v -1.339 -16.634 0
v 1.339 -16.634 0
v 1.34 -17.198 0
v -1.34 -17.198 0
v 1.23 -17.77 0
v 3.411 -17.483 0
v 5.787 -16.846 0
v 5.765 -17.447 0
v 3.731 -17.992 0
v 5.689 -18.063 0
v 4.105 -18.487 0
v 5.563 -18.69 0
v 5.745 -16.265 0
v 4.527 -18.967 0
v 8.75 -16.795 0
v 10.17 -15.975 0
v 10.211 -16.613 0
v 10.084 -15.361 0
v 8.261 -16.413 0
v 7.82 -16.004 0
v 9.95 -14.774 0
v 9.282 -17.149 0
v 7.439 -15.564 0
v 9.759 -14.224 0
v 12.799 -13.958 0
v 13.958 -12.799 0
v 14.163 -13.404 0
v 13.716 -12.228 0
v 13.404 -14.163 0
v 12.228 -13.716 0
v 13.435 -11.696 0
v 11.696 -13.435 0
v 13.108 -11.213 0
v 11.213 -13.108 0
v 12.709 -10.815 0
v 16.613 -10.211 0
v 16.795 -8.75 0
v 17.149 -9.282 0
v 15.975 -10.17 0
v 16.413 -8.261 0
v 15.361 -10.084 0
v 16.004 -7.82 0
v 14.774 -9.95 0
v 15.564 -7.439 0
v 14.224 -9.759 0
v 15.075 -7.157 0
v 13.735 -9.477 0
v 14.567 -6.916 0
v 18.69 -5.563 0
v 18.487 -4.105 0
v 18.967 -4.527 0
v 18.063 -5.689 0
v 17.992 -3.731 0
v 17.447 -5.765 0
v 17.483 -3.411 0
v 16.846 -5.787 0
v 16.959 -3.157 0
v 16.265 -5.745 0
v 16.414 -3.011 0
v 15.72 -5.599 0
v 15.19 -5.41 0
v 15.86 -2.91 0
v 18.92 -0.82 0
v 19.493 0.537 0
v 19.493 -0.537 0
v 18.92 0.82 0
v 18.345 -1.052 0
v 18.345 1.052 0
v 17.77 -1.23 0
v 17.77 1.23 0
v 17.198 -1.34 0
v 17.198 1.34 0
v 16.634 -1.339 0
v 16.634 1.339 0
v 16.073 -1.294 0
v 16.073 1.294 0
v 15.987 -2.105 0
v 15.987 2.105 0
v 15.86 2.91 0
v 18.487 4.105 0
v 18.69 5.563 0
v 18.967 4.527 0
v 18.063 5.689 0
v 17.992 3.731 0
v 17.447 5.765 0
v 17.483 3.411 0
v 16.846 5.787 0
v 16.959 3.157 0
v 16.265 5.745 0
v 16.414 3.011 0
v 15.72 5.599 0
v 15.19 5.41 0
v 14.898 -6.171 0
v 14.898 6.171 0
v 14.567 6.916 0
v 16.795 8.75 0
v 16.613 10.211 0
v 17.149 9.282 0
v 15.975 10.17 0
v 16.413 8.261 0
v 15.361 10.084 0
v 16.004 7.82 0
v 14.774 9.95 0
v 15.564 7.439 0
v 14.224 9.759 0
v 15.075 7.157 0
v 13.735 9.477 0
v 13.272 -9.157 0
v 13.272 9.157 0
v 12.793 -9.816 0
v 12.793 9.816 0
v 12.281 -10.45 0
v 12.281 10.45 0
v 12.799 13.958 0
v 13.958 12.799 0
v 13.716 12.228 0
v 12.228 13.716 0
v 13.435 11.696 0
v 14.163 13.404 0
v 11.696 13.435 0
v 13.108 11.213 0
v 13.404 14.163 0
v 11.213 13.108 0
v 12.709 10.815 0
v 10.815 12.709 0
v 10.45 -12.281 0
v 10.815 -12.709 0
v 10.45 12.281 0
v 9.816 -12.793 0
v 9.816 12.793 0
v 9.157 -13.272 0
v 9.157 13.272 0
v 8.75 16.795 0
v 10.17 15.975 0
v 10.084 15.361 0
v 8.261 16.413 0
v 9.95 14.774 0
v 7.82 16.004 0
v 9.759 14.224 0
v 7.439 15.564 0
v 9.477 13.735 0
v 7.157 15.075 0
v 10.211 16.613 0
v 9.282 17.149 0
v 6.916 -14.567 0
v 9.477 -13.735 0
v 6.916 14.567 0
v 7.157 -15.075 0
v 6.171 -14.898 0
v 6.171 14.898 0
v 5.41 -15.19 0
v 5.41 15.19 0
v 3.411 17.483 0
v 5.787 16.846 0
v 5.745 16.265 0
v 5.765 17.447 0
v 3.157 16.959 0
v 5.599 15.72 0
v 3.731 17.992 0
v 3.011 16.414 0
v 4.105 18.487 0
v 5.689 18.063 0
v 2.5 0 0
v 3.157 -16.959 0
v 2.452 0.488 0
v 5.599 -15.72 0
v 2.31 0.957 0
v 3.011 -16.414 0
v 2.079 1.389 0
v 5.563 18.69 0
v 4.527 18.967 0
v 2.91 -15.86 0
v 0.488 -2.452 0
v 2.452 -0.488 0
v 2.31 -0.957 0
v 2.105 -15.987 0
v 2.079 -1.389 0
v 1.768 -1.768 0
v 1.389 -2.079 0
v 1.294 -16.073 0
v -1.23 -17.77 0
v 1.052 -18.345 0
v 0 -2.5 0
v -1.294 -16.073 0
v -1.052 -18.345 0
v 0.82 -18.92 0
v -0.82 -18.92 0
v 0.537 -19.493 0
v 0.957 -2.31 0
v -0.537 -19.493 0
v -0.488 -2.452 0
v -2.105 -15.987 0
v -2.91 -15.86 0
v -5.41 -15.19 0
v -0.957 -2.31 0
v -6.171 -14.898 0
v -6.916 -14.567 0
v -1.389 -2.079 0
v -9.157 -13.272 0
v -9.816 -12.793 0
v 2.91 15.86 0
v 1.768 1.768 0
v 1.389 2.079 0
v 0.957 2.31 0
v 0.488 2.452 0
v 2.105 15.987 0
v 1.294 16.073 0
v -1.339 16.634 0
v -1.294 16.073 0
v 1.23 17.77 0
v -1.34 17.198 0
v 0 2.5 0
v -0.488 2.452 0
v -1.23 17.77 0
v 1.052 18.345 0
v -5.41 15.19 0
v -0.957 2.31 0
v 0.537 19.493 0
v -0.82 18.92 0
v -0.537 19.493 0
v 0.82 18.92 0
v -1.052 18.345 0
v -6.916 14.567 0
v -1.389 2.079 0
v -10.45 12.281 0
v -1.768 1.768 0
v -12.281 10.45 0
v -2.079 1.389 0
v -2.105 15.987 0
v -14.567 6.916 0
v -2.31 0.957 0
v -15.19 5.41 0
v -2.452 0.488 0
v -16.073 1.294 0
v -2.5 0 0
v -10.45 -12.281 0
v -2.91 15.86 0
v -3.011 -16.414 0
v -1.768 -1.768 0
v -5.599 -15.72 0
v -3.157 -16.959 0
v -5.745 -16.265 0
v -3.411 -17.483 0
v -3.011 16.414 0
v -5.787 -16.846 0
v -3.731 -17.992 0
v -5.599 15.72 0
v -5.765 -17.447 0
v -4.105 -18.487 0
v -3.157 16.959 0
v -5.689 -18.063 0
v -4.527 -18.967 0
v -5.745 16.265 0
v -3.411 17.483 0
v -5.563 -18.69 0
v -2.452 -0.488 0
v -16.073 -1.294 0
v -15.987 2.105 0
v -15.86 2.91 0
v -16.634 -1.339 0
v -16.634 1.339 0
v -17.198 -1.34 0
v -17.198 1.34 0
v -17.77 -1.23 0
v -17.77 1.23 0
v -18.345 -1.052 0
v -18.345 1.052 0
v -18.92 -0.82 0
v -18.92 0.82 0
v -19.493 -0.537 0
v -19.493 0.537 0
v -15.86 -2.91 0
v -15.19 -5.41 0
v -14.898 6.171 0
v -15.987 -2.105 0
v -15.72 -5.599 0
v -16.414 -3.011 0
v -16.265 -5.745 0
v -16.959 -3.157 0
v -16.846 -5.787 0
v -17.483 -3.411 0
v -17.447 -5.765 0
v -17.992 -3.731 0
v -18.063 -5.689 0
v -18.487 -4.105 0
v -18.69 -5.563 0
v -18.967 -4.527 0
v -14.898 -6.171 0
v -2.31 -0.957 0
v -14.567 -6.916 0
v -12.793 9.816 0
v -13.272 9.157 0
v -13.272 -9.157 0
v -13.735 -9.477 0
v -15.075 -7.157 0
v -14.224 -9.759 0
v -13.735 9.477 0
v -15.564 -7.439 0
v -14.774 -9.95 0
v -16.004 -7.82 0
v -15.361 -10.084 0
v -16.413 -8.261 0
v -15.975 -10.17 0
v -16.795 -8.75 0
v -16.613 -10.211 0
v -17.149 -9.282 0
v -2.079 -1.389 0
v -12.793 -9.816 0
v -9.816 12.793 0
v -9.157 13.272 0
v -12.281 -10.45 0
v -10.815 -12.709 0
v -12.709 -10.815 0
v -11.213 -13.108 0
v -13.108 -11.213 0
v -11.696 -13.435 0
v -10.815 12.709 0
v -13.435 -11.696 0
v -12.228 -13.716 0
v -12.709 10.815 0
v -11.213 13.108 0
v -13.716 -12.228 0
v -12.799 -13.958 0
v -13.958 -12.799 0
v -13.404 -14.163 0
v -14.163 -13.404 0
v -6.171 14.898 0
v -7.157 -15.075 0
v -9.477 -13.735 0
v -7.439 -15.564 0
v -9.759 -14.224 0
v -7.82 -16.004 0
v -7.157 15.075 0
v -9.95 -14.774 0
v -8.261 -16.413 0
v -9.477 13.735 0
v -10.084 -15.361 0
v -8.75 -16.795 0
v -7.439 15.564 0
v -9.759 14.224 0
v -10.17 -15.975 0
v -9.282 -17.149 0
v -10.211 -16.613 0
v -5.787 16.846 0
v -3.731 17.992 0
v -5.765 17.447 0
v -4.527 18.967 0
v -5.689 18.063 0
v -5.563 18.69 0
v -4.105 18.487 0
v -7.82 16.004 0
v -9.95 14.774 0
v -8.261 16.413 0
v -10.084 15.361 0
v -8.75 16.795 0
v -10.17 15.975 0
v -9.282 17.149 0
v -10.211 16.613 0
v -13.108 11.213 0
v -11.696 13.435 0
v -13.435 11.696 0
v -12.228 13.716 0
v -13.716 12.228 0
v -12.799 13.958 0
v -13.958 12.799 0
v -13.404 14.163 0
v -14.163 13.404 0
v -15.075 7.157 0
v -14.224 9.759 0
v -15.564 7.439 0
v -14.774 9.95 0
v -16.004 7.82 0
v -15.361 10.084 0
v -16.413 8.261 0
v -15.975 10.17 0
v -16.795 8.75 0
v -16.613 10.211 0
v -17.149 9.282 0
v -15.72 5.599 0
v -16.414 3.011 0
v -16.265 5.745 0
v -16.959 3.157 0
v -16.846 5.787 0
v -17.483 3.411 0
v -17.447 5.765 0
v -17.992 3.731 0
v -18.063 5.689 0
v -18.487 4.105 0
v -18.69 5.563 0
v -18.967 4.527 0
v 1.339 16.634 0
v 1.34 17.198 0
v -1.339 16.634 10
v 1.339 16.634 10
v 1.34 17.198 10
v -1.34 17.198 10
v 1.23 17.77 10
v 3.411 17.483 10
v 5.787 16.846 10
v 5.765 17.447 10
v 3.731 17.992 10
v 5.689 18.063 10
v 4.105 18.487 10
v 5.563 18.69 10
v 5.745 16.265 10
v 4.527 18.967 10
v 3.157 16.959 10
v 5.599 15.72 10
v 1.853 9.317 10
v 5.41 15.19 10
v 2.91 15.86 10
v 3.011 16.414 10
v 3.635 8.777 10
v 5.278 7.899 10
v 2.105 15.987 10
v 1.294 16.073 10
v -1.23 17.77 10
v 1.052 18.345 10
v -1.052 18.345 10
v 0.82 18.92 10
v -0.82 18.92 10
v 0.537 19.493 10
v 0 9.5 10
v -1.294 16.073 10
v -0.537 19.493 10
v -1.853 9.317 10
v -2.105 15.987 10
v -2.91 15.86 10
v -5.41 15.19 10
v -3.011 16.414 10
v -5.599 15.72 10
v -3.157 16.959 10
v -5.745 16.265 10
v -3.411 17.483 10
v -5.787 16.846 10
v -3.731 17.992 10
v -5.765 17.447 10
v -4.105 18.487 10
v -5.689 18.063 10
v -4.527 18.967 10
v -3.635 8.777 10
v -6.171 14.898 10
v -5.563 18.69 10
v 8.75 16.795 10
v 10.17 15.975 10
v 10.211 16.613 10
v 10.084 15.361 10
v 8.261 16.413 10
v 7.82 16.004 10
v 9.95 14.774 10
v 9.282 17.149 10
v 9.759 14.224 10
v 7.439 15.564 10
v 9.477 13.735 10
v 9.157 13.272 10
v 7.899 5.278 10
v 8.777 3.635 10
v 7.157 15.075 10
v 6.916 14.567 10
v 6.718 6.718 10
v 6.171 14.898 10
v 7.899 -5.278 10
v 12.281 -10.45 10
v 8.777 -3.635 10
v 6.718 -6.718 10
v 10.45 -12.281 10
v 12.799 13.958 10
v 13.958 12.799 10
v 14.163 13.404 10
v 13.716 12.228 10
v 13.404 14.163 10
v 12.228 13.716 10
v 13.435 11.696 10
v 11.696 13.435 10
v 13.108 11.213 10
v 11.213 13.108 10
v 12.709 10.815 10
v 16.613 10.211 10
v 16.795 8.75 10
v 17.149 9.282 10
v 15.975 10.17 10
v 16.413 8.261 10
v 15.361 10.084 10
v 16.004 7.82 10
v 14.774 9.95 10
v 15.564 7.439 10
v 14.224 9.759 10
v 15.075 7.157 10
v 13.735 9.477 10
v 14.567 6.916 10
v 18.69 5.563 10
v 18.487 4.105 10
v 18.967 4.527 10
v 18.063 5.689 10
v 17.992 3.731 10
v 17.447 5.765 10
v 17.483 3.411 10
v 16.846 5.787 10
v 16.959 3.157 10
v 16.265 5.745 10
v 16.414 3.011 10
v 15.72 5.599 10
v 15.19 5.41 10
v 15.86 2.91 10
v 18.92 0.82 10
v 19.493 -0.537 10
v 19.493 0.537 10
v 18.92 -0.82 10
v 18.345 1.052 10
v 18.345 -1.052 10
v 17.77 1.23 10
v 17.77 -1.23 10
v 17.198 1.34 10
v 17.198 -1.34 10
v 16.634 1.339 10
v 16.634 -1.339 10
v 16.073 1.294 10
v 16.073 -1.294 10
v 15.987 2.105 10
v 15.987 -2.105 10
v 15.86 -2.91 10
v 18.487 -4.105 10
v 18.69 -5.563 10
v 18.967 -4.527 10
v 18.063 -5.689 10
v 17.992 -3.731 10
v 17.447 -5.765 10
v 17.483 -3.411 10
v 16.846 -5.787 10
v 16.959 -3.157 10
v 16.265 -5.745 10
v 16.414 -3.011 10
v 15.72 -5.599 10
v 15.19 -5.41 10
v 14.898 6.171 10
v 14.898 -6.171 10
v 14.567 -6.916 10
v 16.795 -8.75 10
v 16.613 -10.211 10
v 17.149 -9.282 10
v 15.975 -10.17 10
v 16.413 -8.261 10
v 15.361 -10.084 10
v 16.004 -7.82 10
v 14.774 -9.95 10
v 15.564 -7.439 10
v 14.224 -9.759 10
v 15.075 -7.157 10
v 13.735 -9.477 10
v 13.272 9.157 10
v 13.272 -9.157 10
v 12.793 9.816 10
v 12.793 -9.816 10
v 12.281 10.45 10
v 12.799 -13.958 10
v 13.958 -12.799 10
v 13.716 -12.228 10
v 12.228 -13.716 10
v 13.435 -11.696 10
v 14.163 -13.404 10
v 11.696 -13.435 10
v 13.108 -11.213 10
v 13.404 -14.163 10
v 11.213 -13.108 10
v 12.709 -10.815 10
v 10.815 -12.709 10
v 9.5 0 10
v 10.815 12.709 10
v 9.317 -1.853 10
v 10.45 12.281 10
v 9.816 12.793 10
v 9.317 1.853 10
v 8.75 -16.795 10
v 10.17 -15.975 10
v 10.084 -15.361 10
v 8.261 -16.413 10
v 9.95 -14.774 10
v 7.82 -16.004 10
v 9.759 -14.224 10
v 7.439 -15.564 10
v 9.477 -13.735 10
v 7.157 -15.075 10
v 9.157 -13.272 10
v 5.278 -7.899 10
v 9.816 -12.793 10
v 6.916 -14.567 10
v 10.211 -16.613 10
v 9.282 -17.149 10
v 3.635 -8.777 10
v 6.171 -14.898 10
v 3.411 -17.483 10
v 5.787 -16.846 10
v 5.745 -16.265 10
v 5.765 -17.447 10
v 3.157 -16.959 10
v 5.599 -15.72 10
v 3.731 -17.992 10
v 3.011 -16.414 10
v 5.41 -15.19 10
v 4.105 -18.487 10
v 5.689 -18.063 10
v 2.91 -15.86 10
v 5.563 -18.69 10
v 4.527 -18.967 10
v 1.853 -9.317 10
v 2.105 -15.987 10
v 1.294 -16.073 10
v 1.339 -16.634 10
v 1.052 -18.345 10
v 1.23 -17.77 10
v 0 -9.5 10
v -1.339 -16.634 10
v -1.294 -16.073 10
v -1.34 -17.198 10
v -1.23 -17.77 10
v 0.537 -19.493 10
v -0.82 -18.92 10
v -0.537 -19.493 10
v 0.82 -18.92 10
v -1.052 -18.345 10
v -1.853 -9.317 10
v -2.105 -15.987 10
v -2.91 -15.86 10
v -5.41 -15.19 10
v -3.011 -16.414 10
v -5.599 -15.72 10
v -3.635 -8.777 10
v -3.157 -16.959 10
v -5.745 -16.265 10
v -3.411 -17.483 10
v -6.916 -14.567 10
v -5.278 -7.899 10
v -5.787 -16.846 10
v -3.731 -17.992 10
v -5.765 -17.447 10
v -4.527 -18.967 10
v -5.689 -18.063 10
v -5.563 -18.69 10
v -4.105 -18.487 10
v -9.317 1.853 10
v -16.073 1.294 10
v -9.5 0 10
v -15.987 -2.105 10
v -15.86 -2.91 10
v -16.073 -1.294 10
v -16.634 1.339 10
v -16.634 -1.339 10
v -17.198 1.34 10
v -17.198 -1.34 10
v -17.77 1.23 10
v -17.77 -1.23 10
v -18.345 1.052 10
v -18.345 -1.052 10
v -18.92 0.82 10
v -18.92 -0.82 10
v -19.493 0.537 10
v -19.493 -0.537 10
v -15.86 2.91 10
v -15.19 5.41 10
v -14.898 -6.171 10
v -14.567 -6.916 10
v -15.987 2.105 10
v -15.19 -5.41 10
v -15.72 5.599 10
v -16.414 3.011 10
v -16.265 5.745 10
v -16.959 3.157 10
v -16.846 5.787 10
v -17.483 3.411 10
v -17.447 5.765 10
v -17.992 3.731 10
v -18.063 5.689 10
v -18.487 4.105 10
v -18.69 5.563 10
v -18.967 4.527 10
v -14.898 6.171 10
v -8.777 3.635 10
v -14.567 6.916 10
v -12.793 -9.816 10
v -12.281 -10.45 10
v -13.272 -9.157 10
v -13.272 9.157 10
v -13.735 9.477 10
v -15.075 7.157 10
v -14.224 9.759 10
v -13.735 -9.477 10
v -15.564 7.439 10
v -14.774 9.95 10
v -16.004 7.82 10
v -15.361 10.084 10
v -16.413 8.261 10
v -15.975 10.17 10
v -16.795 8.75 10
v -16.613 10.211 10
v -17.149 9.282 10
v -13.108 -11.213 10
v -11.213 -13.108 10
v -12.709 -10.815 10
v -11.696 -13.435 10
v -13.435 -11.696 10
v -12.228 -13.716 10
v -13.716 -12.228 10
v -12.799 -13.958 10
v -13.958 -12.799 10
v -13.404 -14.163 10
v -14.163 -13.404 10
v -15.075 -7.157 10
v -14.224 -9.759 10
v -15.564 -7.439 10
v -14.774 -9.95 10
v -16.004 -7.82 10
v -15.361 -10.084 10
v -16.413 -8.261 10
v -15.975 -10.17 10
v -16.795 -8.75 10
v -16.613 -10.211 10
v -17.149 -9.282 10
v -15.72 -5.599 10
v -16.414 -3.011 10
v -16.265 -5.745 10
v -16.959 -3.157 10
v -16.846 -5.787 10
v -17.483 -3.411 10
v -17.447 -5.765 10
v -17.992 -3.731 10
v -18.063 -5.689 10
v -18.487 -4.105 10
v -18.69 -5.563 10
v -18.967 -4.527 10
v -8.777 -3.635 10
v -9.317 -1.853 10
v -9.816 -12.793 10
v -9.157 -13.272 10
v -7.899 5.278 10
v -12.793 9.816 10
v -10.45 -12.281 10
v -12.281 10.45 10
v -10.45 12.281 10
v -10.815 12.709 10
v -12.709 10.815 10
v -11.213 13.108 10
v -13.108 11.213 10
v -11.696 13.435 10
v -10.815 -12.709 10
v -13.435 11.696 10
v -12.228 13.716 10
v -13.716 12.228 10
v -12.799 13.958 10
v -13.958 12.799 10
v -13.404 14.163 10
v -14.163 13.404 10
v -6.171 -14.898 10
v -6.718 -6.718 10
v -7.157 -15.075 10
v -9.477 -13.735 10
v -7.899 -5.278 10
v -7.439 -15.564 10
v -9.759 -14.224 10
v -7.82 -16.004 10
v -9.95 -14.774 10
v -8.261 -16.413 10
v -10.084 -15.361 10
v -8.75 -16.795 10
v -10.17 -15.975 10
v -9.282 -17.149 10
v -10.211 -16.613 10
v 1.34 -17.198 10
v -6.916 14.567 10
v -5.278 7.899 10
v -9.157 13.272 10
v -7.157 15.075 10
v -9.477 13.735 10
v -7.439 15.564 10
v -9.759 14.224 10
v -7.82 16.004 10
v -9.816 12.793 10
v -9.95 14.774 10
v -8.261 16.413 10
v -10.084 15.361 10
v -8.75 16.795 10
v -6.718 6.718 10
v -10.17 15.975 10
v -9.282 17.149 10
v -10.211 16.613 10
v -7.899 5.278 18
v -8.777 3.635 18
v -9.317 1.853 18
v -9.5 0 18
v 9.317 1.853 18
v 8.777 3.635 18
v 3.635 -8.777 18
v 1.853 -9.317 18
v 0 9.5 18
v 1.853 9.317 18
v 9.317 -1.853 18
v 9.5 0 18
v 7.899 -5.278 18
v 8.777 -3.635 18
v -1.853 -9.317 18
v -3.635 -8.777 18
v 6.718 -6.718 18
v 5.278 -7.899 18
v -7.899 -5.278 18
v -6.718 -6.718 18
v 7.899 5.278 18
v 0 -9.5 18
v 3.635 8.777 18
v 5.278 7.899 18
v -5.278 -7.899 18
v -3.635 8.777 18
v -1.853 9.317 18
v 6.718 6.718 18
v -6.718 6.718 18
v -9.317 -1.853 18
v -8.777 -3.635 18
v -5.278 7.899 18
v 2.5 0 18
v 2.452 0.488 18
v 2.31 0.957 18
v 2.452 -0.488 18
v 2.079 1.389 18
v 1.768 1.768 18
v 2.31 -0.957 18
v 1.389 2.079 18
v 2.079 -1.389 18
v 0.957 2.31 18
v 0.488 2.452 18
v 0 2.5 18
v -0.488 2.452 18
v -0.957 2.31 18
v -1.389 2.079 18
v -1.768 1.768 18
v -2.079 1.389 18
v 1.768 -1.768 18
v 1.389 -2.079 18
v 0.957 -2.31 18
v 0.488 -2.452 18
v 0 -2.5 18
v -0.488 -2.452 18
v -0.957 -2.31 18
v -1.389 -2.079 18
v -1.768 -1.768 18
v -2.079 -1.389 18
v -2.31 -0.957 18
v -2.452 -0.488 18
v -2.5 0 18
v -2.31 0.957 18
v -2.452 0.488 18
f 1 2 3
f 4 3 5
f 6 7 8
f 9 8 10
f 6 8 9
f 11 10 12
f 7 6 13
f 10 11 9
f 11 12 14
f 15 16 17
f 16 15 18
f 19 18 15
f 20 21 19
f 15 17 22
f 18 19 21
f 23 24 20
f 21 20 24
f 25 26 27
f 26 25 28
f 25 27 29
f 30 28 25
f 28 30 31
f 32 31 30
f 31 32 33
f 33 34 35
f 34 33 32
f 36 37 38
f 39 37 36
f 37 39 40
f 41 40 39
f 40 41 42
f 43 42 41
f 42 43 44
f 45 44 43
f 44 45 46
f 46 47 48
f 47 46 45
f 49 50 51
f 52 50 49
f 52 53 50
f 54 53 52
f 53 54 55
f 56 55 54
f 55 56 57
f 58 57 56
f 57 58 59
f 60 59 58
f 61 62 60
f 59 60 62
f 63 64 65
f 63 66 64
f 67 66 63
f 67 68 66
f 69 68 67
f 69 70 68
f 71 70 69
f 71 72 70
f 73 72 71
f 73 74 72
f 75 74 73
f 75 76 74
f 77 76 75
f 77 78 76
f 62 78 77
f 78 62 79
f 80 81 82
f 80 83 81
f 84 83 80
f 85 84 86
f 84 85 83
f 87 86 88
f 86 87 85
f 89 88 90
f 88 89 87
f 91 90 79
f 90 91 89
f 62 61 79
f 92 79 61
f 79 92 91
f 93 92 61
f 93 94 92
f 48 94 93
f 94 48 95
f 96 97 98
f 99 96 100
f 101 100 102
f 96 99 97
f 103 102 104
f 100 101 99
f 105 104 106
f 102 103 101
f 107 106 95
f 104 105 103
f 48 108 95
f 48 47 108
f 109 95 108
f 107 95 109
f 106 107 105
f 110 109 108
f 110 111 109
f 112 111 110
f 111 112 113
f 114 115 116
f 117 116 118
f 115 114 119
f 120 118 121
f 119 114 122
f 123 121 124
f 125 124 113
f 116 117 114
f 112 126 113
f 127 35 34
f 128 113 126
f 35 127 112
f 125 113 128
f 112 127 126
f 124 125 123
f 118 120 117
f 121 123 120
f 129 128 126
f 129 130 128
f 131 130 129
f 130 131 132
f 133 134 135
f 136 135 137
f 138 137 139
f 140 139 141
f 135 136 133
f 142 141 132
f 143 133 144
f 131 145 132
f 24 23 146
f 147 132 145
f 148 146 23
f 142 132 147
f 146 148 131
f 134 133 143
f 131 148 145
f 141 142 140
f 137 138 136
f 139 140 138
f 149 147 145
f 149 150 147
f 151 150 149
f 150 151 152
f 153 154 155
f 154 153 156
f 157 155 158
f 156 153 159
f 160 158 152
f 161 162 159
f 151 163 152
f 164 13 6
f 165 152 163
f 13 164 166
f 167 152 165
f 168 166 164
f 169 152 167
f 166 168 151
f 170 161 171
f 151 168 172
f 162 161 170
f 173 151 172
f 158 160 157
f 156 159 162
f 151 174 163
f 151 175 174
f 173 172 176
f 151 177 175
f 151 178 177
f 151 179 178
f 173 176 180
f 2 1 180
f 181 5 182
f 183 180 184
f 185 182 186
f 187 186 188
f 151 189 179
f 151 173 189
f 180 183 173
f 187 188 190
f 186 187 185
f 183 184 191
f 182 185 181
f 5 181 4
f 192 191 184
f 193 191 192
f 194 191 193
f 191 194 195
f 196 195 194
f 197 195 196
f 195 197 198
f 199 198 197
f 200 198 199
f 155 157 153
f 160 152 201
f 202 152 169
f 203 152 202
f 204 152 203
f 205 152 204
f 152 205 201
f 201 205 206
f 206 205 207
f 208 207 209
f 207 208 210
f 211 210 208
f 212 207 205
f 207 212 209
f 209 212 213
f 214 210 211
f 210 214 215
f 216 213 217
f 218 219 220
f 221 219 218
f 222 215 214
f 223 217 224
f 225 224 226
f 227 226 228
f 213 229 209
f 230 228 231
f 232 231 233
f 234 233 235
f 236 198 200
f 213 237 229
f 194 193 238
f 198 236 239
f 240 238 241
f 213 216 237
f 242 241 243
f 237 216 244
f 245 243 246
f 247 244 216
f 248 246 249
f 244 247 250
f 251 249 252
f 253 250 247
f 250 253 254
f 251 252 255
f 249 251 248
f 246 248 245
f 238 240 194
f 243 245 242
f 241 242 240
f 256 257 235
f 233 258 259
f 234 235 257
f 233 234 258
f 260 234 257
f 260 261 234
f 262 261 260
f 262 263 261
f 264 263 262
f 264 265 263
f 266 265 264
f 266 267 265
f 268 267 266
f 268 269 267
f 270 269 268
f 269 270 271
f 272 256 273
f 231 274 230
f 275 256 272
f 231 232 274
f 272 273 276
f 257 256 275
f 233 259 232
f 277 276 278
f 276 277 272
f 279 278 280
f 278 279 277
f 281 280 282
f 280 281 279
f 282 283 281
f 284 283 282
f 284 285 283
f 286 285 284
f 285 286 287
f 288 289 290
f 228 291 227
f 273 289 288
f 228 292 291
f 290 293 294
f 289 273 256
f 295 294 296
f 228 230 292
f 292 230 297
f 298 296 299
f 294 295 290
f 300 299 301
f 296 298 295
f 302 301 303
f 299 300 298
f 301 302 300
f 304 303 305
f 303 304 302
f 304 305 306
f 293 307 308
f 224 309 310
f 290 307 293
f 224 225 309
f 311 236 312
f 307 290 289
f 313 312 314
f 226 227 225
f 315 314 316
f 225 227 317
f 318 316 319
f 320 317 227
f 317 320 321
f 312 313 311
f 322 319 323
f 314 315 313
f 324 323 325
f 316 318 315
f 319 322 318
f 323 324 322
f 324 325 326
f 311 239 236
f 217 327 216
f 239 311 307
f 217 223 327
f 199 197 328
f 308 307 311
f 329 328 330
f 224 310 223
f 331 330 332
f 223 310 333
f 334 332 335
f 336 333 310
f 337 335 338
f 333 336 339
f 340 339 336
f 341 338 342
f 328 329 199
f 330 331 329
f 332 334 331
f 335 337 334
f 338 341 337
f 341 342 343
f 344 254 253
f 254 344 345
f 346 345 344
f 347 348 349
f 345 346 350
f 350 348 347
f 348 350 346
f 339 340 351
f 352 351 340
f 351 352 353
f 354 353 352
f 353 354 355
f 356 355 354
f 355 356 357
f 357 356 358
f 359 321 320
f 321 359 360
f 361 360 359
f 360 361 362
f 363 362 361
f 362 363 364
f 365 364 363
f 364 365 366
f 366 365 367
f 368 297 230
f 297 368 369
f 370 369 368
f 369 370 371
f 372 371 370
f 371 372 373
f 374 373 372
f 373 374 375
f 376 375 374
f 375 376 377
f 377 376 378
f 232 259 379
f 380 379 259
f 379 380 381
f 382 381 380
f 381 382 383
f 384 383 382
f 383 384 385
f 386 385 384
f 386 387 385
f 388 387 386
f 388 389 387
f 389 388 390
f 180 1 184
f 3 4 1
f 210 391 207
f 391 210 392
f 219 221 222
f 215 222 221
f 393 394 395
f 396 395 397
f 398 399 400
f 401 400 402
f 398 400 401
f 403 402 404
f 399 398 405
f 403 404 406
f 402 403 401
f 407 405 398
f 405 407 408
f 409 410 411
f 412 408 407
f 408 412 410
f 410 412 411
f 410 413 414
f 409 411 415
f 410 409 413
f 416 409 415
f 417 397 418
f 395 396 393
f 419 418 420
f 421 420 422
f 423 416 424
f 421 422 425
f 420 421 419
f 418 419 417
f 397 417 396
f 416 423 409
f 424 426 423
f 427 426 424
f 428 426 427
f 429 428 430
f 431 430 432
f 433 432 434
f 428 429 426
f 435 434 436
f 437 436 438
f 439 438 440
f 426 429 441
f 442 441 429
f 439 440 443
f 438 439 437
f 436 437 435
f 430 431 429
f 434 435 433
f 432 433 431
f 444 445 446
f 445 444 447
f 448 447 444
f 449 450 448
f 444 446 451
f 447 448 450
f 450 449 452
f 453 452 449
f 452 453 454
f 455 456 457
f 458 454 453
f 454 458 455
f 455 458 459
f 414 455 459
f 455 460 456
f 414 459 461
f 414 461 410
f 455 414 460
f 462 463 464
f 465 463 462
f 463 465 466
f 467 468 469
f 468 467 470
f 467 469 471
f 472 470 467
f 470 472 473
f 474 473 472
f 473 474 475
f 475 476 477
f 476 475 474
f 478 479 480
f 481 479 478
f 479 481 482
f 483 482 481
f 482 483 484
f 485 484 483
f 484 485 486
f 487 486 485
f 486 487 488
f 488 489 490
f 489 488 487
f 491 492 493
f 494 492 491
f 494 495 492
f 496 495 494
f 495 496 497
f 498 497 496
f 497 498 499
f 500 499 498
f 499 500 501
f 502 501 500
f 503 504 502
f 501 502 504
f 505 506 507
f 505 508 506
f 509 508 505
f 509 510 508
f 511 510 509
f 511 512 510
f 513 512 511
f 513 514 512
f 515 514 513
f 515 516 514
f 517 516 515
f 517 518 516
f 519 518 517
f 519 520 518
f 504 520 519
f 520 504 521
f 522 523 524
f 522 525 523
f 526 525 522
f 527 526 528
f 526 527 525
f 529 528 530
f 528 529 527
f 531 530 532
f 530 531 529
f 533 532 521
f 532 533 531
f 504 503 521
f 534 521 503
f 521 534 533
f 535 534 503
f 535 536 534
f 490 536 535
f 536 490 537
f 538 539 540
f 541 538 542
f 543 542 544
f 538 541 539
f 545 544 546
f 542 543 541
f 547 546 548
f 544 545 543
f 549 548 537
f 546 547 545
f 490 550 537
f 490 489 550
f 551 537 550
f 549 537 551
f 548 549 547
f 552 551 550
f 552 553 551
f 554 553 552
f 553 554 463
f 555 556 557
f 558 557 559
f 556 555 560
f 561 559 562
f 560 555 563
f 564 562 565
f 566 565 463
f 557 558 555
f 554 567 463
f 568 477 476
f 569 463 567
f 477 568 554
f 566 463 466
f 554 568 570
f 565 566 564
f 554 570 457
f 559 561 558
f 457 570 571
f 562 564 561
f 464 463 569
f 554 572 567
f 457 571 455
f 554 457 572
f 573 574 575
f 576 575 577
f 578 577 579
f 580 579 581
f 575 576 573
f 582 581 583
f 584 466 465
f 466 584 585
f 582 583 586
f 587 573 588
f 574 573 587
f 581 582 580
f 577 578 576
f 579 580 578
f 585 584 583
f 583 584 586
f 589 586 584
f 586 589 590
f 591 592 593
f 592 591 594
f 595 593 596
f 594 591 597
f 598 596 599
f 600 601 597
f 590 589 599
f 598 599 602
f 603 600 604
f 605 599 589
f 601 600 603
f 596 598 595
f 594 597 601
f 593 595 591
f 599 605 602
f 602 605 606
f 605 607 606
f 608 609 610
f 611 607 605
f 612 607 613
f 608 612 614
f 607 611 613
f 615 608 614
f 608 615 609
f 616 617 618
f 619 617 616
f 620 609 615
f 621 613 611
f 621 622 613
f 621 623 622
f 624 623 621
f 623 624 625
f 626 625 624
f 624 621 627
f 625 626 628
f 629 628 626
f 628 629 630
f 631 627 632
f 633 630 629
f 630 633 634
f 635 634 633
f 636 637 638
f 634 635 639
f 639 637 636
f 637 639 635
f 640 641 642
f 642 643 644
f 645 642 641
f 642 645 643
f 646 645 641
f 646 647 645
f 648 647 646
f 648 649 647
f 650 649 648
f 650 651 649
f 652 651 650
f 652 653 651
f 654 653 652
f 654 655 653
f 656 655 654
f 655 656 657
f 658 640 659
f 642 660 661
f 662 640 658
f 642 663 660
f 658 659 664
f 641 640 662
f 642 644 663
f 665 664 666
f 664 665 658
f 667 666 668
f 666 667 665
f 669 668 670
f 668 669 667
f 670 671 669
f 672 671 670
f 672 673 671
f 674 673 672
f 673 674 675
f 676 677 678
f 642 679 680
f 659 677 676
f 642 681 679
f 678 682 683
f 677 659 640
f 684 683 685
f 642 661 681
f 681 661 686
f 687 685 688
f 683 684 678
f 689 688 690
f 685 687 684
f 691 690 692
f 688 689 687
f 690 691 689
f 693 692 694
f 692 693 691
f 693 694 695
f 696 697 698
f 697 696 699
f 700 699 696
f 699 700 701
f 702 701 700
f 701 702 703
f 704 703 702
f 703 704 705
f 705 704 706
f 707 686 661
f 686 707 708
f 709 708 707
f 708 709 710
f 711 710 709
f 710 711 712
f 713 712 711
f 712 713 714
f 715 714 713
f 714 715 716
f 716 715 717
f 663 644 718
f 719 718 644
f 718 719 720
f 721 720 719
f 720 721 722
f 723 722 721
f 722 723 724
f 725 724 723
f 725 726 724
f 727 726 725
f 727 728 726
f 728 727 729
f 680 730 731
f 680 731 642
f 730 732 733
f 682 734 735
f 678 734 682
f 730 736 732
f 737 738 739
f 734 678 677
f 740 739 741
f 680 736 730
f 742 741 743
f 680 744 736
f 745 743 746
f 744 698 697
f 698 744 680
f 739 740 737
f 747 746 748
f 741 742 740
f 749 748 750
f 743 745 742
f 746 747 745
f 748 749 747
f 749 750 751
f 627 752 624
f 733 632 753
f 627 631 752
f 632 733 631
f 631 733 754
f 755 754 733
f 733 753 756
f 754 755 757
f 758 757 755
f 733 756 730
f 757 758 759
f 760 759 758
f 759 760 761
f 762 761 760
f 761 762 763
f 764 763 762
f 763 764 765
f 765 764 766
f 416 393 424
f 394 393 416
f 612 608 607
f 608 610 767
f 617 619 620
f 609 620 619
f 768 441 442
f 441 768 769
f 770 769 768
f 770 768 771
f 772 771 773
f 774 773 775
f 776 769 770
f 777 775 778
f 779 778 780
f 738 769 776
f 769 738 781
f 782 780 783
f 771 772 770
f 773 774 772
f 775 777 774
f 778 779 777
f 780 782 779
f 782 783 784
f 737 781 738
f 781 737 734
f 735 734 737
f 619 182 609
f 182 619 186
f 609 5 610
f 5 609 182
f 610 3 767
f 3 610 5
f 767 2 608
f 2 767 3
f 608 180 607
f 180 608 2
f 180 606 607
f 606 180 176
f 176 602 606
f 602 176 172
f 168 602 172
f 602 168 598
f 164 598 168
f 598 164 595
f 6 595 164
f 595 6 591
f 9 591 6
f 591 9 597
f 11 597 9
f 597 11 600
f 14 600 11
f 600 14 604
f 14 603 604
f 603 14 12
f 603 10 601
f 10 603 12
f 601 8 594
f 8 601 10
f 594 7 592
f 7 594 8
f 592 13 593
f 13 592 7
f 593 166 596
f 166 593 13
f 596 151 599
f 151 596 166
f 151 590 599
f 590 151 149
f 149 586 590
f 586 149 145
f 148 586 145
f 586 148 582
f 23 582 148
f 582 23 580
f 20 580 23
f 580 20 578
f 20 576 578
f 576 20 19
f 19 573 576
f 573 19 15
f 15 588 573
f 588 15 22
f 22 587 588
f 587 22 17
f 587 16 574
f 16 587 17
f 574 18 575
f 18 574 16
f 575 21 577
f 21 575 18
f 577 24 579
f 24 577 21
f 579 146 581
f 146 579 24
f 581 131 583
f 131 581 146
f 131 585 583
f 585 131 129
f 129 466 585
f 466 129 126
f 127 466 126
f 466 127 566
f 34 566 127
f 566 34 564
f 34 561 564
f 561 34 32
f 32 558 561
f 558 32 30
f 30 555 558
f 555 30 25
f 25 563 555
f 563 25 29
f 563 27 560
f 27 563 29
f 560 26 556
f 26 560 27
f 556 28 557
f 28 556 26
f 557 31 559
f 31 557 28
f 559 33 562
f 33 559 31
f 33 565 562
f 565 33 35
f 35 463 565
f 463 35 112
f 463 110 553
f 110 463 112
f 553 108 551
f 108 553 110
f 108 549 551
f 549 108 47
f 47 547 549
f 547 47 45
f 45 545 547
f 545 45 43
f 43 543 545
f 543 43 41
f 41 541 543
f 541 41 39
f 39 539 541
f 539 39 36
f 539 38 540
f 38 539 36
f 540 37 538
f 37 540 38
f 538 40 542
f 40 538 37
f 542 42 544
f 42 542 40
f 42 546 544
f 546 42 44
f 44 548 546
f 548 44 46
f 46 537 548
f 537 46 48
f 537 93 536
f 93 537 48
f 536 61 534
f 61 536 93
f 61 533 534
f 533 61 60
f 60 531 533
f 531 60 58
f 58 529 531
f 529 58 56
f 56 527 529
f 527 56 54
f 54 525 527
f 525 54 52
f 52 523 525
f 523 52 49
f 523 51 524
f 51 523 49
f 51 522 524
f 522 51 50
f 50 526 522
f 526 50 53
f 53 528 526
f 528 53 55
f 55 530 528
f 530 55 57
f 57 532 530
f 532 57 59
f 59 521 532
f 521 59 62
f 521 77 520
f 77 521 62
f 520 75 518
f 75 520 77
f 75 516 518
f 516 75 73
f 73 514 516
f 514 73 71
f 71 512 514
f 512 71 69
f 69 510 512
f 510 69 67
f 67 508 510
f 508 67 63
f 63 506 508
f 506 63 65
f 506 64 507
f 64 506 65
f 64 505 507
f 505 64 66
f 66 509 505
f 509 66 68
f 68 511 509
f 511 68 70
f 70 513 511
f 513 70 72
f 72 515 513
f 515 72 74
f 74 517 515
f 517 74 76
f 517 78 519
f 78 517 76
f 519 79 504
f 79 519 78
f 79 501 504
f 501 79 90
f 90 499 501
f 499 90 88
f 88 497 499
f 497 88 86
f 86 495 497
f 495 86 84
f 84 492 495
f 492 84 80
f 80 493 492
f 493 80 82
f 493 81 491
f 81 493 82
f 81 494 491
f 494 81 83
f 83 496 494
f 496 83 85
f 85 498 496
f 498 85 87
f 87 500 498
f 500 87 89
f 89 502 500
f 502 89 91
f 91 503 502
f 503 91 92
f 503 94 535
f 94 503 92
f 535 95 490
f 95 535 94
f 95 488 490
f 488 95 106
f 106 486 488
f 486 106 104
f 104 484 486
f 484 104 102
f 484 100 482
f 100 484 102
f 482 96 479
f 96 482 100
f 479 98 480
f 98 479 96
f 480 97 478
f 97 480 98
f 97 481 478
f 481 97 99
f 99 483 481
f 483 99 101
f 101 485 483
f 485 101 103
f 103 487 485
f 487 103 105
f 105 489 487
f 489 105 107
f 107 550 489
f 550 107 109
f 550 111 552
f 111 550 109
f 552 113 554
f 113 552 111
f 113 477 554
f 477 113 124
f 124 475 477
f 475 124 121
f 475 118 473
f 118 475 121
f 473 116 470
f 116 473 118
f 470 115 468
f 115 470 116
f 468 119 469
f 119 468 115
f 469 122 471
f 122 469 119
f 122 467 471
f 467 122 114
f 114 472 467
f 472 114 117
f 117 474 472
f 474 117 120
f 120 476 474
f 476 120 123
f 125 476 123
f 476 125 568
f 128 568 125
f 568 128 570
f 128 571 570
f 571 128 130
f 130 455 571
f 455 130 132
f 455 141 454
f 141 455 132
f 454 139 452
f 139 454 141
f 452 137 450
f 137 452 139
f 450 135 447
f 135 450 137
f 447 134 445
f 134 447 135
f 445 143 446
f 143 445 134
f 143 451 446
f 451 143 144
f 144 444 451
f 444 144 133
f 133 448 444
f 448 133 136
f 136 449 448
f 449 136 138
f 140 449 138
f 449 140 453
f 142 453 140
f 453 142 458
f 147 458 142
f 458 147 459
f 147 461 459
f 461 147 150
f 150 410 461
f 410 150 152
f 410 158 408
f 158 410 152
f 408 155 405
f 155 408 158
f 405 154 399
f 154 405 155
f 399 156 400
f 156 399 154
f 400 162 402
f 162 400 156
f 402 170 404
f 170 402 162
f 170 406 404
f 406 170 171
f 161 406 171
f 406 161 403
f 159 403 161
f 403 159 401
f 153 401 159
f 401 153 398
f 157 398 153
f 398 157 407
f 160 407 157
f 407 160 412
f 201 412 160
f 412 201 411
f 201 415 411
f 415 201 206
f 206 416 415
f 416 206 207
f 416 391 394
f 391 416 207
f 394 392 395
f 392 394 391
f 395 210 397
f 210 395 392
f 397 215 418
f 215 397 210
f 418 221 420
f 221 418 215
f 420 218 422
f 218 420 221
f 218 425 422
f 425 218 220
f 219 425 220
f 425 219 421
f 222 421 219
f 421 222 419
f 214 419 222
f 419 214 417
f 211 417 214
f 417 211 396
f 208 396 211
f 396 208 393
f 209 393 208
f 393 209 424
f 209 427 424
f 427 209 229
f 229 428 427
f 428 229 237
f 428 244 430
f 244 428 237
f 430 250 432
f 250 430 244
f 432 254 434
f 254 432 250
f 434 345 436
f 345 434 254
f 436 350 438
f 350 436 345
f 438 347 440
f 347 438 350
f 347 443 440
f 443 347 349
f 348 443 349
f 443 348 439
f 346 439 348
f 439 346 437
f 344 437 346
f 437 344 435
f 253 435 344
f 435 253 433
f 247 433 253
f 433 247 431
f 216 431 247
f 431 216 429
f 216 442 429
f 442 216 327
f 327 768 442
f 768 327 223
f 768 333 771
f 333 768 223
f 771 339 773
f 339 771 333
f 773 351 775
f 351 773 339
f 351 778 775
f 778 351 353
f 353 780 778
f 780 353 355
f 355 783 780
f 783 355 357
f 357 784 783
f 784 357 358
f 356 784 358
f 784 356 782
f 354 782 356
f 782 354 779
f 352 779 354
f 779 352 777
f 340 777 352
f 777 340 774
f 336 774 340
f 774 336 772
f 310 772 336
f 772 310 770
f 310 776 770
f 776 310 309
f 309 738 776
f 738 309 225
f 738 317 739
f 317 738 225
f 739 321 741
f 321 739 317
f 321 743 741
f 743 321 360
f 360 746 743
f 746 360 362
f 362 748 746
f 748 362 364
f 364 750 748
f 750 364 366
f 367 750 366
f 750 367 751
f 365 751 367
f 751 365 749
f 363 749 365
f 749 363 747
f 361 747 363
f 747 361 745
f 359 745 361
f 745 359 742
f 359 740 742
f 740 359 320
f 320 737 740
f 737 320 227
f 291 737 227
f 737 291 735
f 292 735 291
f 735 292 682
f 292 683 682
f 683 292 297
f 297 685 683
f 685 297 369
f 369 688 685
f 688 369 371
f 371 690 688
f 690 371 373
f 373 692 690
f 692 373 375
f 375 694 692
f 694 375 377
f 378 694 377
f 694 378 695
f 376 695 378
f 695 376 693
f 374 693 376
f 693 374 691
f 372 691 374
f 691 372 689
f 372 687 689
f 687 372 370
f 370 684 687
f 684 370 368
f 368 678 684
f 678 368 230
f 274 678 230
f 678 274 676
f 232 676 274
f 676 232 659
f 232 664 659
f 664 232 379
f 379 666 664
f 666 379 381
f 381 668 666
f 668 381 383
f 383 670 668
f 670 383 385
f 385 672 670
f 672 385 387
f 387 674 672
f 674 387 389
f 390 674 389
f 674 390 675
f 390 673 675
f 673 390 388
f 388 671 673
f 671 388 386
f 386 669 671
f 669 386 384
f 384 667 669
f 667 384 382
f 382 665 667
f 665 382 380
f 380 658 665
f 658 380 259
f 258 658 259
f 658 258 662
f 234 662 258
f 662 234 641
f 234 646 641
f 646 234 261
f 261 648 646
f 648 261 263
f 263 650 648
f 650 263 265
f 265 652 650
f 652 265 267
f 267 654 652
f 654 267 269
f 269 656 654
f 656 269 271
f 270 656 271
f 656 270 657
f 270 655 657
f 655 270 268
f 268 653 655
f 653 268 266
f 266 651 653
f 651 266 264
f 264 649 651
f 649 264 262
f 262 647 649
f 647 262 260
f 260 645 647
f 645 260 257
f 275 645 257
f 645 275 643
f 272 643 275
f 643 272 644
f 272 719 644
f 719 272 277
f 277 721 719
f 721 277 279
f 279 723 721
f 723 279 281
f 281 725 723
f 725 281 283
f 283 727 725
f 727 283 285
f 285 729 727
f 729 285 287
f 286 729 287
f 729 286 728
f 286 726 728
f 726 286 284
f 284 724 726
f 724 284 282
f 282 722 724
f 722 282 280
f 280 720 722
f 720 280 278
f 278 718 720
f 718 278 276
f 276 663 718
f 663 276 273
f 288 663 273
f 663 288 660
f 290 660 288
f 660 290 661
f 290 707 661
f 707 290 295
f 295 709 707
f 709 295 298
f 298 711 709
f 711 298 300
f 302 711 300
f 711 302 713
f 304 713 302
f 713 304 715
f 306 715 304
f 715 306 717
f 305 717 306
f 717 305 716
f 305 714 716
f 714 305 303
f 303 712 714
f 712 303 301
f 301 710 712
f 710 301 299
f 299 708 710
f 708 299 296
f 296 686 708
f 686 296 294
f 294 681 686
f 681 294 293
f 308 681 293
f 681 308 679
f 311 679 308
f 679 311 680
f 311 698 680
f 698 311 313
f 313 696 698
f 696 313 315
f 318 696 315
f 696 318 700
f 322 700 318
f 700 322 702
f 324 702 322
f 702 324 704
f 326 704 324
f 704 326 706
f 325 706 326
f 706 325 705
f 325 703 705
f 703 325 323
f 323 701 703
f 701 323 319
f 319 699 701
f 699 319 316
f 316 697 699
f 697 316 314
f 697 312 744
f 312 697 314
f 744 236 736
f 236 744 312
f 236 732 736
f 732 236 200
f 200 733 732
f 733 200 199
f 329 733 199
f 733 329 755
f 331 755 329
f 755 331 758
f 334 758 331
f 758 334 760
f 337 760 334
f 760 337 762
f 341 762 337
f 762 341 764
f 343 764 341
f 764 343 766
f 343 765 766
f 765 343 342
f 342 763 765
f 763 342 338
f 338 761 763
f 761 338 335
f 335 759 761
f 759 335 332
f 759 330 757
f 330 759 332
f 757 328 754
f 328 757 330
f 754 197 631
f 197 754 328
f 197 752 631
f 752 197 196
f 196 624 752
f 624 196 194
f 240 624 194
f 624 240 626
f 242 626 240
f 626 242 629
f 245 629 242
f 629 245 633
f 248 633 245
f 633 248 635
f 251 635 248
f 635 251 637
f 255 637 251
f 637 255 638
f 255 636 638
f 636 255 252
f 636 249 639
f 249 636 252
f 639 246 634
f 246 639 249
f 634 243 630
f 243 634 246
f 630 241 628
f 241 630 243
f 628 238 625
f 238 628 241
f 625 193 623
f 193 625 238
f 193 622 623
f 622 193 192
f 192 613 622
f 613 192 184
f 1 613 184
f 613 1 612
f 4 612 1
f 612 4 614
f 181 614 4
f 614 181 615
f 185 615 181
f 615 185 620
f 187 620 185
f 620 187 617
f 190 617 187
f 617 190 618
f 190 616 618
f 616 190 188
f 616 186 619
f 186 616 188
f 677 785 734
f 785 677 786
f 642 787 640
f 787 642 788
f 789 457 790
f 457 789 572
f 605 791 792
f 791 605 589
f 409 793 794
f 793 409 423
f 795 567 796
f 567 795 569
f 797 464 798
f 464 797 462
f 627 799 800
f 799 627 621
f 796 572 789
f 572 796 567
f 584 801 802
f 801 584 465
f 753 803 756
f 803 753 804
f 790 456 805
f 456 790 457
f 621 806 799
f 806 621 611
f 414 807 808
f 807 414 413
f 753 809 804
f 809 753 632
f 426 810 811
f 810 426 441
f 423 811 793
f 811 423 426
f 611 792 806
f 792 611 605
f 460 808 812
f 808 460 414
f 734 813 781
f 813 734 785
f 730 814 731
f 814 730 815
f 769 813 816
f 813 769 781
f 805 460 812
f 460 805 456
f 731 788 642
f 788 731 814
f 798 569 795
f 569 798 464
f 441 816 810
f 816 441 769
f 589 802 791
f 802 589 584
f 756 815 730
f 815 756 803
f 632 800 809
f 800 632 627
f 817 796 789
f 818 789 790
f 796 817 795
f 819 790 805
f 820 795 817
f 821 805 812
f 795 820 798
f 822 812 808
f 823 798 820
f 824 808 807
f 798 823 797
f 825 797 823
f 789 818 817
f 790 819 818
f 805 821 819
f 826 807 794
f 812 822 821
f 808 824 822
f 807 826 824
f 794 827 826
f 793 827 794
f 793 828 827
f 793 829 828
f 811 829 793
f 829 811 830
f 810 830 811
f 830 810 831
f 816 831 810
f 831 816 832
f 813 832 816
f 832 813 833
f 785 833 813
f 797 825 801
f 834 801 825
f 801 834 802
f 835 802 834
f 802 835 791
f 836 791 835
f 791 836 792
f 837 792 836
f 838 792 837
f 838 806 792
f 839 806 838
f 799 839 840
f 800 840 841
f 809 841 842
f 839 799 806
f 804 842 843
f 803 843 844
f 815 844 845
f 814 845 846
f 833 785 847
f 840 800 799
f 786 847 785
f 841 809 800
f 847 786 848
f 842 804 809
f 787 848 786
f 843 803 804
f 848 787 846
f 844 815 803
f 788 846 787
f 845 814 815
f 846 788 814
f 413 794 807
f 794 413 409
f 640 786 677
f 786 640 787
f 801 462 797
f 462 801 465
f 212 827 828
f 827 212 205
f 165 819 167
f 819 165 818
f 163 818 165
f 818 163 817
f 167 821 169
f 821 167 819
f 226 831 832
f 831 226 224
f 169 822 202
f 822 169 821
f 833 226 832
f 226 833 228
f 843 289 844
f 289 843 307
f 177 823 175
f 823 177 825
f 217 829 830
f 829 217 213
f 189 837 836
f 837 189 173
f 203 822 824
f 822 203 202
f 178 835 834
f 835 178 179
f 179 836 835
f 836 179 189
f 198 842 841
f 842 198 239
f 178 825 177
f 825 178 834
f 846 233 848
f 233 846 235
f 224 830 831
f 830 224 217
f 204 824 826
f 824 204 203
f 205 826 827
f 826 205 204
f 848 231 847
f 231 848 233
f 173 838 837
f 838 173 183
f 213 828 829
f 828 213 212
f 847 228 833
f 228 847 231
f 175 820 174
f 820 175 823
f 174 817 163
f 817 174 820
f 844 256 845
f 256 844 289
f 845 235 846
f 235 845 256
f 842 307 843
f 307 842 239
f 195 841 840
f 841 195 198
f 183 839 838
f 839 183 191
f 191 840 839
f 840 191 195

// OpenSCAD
$fn = 32;

// ----------------------------------------------------------------------
// Spur gear: m=1.5 z=24, 39 mm tip diameter x 18 mm
// ----------------------------------------------------------------------

// --- parameters (mm) ---
gear_module = 1.5;        // module
tooth_count = 24;         // number of teeth
gear_w = 10;              // face width
pa = 20;                  // pressure angle, deg
bore = 5;                 // shaft bore
hub_dia = 19;             // hub diameter
hub_len = 8;              // hub above the face

/* --- involute profile --- */
pitch_r = gear_module * tooth_count / 2;
base_r = pitch_r * cos(pa);
tip_r = pitch_r + gear_module;
root_r = pitch_r - 1.25 * gear_module;
flank_steps = 6;

function inv_deg(a) = (tan(a) - a * PI / 180) * 180 / PI;
function flank_r(i) = root_r + (tip_r - root_r) * i / flank_steps;
function half_angle(r) = 90 / tooth_count + inv_deg(pa) - inv_deg(acos(min(1, base_r / r)));
function tooth_pt(k, i, side) =
    let (r = flank_r(i), a = k * 360 / tooth_count + side * half_angle(r))
    [r * cos(a), r * sin(a)];

module tooth_profile() {
  polygon(points = [
    for (k = [0 : tooth_count - 1])
      each [
        for (i = [0 : flank_steps]) tooth_pt(k, i, -1),
        for (i = [flank_steps : -1 : 0]) tooth_pt(k, i, 1),
        let (ta = (k + 0.5) * 360 / tooth_count)
          [root_r * cos(ta), root_r * sin(ta)]
      ]
  ]);
}

module gear_disc() {
  linear_extrude(height = gear_w) tooth_profile();
}

module hub_boss() {
  translate([0, 0, gear_w - 1]) cylinder(h = hub_len + 1, d = hub_dia);
}

difference() {
  union() {
    gear_disc();
    hub_boss();
  }
  translate([0, 0, -1]) cylinder(h = gear_w + hub_len + 3, d = bore);
}
